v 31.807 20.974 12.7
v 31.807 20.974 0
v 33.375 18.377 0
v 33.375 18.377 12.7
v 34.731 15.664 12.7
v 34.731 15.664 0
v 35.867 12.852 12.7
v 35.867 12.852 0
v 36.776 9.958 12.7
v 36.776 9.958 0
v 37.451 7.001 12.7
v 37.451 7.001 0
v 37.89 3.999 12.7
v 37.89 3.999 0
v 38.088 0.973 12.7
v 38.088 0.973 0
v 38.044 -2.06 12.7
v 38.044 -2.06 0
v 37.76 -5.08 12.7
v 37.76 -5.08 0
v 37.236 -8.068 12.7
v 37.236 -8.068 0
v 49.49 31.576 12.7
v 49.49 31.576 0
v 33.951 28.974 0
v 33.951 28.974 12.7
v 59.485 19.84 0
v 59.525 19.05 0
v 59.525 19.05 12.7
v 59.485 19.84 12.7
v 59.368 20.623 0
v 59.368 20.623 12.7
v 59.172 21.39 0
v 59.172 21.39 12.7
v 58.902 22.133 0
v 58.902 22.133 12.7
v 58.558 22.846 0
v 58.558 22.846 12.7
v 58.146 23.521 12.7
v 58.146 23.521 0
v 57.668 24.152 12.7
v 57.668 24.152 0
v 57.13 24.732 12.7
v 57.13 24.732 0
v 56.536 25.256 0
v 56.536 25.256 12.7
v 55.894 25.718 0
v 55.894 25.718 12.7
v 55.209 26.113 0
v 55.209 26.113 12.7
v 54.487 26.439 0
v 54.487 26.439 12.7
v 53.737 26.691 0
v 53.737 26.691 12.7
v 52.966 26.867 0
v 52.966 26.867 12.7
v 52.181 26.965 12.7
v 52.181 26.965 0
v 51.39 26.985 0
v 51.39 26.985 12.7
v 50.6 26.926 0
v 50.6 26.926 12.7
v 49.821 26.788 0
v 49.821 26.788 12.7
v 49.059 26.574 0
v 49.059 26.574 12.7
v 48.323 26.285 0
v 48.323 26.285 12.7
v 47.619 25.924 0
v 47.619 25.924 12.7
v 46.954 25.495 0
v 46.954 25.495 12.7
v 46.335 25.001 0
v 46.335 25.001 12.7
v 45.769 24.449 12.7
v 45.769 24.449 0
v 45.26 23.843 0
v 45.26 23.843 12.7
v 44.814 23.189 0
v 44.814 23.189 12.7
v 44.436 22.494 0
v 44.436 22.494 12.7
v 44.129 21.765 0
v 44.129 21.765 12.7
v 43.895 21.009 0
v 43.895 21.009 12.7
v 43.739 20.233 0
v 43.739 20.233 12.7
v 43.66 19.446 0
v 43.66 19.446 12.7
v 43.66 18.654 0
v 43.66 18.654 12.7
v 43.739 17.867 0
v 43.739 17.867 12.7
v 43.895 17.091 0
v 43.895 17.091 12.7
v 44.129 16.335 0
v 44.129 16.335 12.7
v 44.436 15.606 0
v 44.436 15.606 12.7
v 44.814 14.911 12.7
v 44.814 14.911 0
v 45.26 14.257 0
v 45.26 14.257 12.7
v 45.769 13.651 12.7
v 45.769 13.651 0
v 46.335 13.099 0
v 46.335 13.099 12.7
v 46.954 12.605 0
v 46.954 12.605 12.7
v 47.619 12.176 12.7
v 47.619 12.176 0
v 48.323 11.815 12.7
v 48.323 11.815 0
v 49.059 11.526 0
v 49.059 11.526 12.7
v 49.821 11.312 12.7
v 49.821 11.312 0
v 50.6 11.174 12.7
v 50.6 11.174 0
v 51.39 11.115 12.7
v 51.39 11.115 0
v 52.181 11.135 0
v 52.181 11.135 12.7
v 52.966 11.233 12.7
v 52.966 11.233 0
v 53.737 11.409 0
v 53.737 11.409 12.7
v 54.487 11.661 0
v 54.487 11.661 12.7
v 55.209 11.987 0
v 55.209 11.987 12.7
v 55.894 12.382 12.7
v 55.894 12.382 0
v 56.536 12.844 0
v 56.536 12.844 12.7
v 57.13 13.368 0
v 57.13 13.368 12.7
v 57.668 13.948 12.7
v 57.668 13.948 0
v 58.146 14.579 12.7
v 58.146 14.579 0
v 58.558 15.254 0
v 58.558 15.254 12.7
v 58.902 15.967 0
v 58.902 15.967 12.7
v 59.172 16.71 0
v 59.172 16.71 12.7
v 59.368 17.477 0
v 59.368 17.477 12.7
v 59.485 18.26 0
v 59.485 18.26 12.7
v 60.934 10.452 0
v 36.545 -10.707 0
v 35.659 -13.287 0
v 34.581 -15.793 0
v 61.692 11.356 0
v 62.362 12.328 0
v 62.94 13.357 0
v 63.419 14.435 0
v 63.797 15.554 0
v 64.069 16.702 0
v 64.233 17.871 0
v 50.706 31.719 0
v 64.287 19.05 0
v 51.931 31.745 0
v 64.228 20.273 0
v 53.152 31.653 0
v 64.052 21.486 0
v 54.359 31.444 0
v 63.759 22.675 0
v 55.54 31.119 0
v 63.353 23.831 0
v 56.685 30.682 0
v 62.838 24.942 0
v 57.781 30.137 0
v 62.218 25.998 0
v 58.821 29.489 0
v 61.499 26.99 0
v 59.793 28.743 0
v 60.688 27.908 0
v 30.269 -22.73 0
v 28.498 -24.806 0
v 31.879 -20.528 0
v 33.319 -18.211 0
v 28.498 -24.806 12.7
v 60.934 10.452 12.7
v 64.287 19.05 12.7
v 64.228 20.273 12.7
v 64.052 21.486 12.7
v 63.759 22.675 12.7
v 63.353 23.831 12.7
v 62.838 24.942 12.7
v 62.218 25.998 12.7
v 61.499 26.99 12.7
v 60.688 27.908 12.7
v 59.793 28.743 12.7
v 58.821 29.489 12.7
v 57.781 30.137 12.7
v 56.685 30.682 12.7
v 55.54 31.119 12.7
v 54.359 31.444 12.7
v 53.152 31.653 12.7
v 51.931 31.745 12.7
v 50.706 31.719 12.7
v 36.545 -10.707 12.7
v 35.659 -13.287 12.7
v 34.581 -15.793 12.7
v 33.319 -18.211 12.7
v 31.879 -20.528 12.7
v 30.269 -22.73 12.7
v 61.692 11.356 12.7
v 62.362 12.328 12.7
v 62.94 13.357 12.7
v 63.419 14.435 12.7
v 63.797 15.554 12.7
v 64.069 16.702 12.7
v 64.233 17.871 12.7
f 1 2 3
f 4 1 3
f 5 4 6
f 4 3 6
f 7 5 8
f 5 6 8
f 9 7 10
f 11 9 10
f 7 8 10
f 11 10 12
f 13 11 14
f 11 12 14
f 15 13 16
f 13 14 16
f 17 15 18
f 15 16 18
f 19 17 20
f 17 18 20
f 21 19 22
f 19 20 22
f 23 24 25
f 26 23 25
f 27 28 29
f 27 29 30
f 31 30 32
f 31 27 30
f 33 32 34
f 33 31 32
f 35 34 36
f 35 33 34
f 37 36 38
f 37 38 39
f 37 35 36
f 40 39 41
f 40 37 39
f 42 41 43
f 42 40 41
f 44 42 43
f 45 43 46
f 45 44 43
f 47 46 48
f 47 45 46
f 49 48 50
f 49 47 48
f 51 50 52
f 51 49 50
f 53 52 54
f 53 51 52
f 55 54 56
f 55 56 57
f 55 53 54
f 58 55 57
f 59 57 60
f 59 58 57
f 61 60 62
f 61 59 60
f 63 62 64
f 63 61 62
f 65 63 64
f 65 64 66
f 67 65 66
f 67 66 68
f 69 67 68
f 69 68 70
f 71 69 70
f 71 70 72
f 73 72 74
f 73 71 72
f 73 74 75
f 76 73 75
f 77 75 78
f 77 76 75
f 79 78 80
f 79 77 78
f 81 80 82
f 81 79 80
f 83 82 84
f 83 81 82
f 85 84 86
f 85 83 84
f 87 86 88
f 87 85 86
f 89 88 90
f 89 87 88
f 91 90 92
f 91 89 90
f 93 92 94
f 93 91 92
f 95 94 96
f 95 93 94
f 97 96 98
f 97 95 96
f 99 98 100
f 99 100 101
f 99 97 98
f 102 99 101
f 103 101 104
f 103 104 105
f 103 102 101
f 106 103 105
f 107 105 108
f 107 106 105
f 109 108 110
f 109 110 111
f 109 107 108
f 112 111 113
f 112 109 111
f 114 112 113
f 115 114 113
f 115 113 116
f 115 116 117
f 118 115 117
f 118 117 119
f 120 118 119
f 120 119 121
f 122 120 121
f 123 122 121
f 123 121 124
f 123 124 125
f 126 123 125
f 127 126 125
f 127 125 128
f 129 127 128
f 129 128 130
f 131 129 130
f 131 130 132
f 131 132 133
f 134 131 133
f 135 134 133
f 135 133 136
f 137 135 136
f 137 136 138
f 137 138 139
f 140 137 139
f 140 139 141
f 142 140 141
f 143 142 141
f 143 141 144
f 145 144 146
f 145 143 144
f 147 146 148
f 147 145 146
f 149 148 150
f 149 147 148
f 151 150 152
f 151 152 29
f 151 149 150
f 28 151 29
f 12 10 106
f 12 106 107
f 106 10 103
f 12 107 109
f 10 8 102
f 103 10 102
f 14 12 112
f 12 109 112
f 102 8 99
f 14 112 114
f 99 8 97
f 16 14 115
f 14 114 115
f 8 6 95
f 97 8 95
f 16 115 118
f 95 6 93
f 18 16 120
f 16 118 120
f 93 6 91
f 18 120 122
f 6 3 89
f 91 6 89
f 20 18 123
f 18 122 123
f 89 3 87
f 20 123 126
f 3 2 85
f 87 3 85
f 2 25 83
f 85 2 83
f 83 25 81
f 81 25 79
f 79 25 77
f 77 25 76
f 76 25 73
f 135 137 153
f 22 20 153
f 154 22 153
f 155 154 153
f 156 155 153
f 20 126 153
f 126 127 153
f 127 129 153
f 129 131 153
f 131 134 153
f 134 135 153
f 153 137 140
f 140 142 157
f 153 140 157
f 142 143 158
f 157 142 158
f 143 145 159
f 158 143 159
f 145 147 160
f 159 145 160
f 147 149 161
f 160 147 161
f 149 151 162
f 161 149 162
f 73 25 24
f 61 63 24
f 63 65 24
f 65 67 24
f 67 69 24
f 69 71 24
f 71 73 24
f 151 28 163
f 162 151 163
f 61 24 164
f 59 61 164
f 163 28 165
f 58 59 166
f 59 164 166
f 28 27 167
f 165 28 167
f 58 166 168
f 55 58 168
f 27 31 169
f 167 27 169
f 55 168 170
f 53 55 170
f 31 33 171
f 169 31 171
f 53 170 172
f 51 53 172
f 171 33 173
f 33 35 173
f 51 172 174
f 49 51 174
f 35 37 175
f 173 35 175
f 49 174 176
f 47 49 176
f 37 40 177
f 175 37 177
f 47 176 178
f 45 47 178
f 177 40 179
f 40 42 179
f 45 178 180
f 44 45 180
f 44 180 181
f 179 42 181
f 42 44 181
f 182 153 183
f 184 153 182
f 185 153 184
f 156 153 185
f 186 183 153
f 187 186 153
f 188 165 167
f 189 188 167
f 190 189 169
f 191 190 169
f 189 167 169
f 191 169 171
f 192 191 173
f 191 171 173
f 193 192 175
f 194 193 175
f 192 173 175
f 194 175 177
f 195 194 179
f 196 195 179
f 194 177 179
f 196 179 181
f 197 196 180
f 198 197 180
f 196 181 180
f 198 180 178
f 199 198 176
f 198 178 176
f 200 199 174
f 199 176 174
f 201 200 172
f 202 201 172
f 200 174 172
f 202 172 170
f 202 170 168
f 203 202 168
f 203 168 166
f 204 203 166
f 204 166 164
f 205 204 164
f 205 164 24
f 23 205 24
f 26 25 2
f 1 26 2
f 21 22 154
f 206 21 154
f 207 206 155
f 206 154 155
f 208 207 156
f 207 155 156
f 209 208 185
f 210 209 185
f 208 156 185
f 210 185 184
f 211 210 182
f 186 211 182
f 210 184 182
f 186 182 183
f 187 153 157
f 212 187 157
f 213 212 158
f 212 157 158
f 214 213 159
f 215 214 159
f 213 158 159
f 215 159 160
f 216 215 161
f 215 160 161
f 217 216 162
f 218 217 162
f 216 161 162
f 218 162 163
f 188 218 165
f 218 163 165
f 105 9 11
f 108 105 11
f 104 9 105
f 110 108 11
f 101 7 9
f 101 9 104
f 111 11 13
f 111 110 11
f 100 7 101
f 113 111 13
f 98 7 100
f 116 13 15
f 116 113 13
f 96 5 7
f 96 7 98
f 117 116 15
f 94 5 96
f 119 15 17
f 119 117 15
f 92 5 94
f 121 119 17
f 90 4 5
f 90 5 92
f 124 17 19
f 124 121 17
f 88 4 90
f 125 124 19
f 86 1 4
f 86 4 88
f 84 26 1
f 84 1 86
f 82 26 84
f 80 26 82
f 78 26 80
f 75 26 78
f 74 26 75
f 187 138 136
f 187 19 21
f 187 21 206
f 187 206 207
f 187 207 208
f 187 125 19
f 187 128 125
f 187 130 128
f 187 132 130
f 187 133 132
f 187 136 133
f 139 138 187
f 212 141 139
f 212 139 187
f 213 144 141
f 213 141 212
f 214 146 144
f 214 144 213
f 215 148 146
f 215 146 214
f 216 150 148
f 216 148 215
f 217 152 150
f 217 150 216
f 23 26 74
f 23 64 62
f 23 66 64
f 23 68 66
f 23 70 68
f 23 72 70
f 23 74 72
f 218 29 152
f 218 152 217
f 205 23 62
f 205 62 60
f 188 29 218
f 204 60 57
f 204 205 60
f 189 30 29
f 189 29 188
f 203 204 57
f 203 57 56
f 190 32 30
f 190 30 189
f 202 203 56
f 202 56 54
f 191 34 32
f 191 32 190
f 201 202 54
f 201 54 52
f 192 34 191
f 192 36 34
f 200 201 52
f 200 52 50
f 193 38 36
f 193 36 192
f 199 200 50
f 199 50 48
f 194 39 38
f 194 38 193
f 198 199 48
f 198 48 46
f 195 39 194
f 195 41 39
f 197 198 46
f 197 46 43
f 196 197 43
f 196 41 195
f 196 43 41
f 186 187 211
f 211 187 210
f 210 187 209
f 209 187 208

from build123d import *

# Parameters (mm, degrees)
F0_R     = 7.9375
F1_DEPTH = 12.7


with BuildPart() as f1:
    # F0 (on Top) → F1 (new body)
    with BuildSketch(Plane.XY):
        with BuildLine():
            ThreePointArc((31.8073335192, 20.9738774288), (37.4513031941, 7.0007063262), (37.2360288719, -8.0677229656))
            ThreePointArc((37.2360288719, -8.0677229656), (33.9725367984, -17.0138251575), (28.4983711579, -24.8059131627))
            Line((28.4983711579, -24.8059131627), (60.9339033423, 10.4515771637))
            ThreePointArc((60.9339033423, 10.4515771637), (40.4207699943, 13.0005062761), (49.4900105586, 31.5756120621))
            Line((49.4900105586, 31.5756120621), (33.9508555908, 28.9736107071))
            Line((33.9508555908, 28.9736107071), (31.8073335192, 20.9738774288))
        make_face()
        with BuildLine():
            ThreePointArc((49.4900105586, 31.5756120621), (40.4207699943, 13.0005062761), (60.9339033423, 10.4515771637))
            ThreePointArc((60.9339033423, 10.4515771637), (63.4193607937, 14.4353815135), (64.2874, 19.05))
            ThreePointArc((64.2874, 19.05), (59.79267739, 28.7434732141), (49.4900105586, 31.5756120621))
        make_face()
        with Locations((51.5874, 19.05)):
            Circle(F0_R, mode=Mode.SUBTRACT)
    extrude(amount=F1_DEPTH)


solid = f1.part
